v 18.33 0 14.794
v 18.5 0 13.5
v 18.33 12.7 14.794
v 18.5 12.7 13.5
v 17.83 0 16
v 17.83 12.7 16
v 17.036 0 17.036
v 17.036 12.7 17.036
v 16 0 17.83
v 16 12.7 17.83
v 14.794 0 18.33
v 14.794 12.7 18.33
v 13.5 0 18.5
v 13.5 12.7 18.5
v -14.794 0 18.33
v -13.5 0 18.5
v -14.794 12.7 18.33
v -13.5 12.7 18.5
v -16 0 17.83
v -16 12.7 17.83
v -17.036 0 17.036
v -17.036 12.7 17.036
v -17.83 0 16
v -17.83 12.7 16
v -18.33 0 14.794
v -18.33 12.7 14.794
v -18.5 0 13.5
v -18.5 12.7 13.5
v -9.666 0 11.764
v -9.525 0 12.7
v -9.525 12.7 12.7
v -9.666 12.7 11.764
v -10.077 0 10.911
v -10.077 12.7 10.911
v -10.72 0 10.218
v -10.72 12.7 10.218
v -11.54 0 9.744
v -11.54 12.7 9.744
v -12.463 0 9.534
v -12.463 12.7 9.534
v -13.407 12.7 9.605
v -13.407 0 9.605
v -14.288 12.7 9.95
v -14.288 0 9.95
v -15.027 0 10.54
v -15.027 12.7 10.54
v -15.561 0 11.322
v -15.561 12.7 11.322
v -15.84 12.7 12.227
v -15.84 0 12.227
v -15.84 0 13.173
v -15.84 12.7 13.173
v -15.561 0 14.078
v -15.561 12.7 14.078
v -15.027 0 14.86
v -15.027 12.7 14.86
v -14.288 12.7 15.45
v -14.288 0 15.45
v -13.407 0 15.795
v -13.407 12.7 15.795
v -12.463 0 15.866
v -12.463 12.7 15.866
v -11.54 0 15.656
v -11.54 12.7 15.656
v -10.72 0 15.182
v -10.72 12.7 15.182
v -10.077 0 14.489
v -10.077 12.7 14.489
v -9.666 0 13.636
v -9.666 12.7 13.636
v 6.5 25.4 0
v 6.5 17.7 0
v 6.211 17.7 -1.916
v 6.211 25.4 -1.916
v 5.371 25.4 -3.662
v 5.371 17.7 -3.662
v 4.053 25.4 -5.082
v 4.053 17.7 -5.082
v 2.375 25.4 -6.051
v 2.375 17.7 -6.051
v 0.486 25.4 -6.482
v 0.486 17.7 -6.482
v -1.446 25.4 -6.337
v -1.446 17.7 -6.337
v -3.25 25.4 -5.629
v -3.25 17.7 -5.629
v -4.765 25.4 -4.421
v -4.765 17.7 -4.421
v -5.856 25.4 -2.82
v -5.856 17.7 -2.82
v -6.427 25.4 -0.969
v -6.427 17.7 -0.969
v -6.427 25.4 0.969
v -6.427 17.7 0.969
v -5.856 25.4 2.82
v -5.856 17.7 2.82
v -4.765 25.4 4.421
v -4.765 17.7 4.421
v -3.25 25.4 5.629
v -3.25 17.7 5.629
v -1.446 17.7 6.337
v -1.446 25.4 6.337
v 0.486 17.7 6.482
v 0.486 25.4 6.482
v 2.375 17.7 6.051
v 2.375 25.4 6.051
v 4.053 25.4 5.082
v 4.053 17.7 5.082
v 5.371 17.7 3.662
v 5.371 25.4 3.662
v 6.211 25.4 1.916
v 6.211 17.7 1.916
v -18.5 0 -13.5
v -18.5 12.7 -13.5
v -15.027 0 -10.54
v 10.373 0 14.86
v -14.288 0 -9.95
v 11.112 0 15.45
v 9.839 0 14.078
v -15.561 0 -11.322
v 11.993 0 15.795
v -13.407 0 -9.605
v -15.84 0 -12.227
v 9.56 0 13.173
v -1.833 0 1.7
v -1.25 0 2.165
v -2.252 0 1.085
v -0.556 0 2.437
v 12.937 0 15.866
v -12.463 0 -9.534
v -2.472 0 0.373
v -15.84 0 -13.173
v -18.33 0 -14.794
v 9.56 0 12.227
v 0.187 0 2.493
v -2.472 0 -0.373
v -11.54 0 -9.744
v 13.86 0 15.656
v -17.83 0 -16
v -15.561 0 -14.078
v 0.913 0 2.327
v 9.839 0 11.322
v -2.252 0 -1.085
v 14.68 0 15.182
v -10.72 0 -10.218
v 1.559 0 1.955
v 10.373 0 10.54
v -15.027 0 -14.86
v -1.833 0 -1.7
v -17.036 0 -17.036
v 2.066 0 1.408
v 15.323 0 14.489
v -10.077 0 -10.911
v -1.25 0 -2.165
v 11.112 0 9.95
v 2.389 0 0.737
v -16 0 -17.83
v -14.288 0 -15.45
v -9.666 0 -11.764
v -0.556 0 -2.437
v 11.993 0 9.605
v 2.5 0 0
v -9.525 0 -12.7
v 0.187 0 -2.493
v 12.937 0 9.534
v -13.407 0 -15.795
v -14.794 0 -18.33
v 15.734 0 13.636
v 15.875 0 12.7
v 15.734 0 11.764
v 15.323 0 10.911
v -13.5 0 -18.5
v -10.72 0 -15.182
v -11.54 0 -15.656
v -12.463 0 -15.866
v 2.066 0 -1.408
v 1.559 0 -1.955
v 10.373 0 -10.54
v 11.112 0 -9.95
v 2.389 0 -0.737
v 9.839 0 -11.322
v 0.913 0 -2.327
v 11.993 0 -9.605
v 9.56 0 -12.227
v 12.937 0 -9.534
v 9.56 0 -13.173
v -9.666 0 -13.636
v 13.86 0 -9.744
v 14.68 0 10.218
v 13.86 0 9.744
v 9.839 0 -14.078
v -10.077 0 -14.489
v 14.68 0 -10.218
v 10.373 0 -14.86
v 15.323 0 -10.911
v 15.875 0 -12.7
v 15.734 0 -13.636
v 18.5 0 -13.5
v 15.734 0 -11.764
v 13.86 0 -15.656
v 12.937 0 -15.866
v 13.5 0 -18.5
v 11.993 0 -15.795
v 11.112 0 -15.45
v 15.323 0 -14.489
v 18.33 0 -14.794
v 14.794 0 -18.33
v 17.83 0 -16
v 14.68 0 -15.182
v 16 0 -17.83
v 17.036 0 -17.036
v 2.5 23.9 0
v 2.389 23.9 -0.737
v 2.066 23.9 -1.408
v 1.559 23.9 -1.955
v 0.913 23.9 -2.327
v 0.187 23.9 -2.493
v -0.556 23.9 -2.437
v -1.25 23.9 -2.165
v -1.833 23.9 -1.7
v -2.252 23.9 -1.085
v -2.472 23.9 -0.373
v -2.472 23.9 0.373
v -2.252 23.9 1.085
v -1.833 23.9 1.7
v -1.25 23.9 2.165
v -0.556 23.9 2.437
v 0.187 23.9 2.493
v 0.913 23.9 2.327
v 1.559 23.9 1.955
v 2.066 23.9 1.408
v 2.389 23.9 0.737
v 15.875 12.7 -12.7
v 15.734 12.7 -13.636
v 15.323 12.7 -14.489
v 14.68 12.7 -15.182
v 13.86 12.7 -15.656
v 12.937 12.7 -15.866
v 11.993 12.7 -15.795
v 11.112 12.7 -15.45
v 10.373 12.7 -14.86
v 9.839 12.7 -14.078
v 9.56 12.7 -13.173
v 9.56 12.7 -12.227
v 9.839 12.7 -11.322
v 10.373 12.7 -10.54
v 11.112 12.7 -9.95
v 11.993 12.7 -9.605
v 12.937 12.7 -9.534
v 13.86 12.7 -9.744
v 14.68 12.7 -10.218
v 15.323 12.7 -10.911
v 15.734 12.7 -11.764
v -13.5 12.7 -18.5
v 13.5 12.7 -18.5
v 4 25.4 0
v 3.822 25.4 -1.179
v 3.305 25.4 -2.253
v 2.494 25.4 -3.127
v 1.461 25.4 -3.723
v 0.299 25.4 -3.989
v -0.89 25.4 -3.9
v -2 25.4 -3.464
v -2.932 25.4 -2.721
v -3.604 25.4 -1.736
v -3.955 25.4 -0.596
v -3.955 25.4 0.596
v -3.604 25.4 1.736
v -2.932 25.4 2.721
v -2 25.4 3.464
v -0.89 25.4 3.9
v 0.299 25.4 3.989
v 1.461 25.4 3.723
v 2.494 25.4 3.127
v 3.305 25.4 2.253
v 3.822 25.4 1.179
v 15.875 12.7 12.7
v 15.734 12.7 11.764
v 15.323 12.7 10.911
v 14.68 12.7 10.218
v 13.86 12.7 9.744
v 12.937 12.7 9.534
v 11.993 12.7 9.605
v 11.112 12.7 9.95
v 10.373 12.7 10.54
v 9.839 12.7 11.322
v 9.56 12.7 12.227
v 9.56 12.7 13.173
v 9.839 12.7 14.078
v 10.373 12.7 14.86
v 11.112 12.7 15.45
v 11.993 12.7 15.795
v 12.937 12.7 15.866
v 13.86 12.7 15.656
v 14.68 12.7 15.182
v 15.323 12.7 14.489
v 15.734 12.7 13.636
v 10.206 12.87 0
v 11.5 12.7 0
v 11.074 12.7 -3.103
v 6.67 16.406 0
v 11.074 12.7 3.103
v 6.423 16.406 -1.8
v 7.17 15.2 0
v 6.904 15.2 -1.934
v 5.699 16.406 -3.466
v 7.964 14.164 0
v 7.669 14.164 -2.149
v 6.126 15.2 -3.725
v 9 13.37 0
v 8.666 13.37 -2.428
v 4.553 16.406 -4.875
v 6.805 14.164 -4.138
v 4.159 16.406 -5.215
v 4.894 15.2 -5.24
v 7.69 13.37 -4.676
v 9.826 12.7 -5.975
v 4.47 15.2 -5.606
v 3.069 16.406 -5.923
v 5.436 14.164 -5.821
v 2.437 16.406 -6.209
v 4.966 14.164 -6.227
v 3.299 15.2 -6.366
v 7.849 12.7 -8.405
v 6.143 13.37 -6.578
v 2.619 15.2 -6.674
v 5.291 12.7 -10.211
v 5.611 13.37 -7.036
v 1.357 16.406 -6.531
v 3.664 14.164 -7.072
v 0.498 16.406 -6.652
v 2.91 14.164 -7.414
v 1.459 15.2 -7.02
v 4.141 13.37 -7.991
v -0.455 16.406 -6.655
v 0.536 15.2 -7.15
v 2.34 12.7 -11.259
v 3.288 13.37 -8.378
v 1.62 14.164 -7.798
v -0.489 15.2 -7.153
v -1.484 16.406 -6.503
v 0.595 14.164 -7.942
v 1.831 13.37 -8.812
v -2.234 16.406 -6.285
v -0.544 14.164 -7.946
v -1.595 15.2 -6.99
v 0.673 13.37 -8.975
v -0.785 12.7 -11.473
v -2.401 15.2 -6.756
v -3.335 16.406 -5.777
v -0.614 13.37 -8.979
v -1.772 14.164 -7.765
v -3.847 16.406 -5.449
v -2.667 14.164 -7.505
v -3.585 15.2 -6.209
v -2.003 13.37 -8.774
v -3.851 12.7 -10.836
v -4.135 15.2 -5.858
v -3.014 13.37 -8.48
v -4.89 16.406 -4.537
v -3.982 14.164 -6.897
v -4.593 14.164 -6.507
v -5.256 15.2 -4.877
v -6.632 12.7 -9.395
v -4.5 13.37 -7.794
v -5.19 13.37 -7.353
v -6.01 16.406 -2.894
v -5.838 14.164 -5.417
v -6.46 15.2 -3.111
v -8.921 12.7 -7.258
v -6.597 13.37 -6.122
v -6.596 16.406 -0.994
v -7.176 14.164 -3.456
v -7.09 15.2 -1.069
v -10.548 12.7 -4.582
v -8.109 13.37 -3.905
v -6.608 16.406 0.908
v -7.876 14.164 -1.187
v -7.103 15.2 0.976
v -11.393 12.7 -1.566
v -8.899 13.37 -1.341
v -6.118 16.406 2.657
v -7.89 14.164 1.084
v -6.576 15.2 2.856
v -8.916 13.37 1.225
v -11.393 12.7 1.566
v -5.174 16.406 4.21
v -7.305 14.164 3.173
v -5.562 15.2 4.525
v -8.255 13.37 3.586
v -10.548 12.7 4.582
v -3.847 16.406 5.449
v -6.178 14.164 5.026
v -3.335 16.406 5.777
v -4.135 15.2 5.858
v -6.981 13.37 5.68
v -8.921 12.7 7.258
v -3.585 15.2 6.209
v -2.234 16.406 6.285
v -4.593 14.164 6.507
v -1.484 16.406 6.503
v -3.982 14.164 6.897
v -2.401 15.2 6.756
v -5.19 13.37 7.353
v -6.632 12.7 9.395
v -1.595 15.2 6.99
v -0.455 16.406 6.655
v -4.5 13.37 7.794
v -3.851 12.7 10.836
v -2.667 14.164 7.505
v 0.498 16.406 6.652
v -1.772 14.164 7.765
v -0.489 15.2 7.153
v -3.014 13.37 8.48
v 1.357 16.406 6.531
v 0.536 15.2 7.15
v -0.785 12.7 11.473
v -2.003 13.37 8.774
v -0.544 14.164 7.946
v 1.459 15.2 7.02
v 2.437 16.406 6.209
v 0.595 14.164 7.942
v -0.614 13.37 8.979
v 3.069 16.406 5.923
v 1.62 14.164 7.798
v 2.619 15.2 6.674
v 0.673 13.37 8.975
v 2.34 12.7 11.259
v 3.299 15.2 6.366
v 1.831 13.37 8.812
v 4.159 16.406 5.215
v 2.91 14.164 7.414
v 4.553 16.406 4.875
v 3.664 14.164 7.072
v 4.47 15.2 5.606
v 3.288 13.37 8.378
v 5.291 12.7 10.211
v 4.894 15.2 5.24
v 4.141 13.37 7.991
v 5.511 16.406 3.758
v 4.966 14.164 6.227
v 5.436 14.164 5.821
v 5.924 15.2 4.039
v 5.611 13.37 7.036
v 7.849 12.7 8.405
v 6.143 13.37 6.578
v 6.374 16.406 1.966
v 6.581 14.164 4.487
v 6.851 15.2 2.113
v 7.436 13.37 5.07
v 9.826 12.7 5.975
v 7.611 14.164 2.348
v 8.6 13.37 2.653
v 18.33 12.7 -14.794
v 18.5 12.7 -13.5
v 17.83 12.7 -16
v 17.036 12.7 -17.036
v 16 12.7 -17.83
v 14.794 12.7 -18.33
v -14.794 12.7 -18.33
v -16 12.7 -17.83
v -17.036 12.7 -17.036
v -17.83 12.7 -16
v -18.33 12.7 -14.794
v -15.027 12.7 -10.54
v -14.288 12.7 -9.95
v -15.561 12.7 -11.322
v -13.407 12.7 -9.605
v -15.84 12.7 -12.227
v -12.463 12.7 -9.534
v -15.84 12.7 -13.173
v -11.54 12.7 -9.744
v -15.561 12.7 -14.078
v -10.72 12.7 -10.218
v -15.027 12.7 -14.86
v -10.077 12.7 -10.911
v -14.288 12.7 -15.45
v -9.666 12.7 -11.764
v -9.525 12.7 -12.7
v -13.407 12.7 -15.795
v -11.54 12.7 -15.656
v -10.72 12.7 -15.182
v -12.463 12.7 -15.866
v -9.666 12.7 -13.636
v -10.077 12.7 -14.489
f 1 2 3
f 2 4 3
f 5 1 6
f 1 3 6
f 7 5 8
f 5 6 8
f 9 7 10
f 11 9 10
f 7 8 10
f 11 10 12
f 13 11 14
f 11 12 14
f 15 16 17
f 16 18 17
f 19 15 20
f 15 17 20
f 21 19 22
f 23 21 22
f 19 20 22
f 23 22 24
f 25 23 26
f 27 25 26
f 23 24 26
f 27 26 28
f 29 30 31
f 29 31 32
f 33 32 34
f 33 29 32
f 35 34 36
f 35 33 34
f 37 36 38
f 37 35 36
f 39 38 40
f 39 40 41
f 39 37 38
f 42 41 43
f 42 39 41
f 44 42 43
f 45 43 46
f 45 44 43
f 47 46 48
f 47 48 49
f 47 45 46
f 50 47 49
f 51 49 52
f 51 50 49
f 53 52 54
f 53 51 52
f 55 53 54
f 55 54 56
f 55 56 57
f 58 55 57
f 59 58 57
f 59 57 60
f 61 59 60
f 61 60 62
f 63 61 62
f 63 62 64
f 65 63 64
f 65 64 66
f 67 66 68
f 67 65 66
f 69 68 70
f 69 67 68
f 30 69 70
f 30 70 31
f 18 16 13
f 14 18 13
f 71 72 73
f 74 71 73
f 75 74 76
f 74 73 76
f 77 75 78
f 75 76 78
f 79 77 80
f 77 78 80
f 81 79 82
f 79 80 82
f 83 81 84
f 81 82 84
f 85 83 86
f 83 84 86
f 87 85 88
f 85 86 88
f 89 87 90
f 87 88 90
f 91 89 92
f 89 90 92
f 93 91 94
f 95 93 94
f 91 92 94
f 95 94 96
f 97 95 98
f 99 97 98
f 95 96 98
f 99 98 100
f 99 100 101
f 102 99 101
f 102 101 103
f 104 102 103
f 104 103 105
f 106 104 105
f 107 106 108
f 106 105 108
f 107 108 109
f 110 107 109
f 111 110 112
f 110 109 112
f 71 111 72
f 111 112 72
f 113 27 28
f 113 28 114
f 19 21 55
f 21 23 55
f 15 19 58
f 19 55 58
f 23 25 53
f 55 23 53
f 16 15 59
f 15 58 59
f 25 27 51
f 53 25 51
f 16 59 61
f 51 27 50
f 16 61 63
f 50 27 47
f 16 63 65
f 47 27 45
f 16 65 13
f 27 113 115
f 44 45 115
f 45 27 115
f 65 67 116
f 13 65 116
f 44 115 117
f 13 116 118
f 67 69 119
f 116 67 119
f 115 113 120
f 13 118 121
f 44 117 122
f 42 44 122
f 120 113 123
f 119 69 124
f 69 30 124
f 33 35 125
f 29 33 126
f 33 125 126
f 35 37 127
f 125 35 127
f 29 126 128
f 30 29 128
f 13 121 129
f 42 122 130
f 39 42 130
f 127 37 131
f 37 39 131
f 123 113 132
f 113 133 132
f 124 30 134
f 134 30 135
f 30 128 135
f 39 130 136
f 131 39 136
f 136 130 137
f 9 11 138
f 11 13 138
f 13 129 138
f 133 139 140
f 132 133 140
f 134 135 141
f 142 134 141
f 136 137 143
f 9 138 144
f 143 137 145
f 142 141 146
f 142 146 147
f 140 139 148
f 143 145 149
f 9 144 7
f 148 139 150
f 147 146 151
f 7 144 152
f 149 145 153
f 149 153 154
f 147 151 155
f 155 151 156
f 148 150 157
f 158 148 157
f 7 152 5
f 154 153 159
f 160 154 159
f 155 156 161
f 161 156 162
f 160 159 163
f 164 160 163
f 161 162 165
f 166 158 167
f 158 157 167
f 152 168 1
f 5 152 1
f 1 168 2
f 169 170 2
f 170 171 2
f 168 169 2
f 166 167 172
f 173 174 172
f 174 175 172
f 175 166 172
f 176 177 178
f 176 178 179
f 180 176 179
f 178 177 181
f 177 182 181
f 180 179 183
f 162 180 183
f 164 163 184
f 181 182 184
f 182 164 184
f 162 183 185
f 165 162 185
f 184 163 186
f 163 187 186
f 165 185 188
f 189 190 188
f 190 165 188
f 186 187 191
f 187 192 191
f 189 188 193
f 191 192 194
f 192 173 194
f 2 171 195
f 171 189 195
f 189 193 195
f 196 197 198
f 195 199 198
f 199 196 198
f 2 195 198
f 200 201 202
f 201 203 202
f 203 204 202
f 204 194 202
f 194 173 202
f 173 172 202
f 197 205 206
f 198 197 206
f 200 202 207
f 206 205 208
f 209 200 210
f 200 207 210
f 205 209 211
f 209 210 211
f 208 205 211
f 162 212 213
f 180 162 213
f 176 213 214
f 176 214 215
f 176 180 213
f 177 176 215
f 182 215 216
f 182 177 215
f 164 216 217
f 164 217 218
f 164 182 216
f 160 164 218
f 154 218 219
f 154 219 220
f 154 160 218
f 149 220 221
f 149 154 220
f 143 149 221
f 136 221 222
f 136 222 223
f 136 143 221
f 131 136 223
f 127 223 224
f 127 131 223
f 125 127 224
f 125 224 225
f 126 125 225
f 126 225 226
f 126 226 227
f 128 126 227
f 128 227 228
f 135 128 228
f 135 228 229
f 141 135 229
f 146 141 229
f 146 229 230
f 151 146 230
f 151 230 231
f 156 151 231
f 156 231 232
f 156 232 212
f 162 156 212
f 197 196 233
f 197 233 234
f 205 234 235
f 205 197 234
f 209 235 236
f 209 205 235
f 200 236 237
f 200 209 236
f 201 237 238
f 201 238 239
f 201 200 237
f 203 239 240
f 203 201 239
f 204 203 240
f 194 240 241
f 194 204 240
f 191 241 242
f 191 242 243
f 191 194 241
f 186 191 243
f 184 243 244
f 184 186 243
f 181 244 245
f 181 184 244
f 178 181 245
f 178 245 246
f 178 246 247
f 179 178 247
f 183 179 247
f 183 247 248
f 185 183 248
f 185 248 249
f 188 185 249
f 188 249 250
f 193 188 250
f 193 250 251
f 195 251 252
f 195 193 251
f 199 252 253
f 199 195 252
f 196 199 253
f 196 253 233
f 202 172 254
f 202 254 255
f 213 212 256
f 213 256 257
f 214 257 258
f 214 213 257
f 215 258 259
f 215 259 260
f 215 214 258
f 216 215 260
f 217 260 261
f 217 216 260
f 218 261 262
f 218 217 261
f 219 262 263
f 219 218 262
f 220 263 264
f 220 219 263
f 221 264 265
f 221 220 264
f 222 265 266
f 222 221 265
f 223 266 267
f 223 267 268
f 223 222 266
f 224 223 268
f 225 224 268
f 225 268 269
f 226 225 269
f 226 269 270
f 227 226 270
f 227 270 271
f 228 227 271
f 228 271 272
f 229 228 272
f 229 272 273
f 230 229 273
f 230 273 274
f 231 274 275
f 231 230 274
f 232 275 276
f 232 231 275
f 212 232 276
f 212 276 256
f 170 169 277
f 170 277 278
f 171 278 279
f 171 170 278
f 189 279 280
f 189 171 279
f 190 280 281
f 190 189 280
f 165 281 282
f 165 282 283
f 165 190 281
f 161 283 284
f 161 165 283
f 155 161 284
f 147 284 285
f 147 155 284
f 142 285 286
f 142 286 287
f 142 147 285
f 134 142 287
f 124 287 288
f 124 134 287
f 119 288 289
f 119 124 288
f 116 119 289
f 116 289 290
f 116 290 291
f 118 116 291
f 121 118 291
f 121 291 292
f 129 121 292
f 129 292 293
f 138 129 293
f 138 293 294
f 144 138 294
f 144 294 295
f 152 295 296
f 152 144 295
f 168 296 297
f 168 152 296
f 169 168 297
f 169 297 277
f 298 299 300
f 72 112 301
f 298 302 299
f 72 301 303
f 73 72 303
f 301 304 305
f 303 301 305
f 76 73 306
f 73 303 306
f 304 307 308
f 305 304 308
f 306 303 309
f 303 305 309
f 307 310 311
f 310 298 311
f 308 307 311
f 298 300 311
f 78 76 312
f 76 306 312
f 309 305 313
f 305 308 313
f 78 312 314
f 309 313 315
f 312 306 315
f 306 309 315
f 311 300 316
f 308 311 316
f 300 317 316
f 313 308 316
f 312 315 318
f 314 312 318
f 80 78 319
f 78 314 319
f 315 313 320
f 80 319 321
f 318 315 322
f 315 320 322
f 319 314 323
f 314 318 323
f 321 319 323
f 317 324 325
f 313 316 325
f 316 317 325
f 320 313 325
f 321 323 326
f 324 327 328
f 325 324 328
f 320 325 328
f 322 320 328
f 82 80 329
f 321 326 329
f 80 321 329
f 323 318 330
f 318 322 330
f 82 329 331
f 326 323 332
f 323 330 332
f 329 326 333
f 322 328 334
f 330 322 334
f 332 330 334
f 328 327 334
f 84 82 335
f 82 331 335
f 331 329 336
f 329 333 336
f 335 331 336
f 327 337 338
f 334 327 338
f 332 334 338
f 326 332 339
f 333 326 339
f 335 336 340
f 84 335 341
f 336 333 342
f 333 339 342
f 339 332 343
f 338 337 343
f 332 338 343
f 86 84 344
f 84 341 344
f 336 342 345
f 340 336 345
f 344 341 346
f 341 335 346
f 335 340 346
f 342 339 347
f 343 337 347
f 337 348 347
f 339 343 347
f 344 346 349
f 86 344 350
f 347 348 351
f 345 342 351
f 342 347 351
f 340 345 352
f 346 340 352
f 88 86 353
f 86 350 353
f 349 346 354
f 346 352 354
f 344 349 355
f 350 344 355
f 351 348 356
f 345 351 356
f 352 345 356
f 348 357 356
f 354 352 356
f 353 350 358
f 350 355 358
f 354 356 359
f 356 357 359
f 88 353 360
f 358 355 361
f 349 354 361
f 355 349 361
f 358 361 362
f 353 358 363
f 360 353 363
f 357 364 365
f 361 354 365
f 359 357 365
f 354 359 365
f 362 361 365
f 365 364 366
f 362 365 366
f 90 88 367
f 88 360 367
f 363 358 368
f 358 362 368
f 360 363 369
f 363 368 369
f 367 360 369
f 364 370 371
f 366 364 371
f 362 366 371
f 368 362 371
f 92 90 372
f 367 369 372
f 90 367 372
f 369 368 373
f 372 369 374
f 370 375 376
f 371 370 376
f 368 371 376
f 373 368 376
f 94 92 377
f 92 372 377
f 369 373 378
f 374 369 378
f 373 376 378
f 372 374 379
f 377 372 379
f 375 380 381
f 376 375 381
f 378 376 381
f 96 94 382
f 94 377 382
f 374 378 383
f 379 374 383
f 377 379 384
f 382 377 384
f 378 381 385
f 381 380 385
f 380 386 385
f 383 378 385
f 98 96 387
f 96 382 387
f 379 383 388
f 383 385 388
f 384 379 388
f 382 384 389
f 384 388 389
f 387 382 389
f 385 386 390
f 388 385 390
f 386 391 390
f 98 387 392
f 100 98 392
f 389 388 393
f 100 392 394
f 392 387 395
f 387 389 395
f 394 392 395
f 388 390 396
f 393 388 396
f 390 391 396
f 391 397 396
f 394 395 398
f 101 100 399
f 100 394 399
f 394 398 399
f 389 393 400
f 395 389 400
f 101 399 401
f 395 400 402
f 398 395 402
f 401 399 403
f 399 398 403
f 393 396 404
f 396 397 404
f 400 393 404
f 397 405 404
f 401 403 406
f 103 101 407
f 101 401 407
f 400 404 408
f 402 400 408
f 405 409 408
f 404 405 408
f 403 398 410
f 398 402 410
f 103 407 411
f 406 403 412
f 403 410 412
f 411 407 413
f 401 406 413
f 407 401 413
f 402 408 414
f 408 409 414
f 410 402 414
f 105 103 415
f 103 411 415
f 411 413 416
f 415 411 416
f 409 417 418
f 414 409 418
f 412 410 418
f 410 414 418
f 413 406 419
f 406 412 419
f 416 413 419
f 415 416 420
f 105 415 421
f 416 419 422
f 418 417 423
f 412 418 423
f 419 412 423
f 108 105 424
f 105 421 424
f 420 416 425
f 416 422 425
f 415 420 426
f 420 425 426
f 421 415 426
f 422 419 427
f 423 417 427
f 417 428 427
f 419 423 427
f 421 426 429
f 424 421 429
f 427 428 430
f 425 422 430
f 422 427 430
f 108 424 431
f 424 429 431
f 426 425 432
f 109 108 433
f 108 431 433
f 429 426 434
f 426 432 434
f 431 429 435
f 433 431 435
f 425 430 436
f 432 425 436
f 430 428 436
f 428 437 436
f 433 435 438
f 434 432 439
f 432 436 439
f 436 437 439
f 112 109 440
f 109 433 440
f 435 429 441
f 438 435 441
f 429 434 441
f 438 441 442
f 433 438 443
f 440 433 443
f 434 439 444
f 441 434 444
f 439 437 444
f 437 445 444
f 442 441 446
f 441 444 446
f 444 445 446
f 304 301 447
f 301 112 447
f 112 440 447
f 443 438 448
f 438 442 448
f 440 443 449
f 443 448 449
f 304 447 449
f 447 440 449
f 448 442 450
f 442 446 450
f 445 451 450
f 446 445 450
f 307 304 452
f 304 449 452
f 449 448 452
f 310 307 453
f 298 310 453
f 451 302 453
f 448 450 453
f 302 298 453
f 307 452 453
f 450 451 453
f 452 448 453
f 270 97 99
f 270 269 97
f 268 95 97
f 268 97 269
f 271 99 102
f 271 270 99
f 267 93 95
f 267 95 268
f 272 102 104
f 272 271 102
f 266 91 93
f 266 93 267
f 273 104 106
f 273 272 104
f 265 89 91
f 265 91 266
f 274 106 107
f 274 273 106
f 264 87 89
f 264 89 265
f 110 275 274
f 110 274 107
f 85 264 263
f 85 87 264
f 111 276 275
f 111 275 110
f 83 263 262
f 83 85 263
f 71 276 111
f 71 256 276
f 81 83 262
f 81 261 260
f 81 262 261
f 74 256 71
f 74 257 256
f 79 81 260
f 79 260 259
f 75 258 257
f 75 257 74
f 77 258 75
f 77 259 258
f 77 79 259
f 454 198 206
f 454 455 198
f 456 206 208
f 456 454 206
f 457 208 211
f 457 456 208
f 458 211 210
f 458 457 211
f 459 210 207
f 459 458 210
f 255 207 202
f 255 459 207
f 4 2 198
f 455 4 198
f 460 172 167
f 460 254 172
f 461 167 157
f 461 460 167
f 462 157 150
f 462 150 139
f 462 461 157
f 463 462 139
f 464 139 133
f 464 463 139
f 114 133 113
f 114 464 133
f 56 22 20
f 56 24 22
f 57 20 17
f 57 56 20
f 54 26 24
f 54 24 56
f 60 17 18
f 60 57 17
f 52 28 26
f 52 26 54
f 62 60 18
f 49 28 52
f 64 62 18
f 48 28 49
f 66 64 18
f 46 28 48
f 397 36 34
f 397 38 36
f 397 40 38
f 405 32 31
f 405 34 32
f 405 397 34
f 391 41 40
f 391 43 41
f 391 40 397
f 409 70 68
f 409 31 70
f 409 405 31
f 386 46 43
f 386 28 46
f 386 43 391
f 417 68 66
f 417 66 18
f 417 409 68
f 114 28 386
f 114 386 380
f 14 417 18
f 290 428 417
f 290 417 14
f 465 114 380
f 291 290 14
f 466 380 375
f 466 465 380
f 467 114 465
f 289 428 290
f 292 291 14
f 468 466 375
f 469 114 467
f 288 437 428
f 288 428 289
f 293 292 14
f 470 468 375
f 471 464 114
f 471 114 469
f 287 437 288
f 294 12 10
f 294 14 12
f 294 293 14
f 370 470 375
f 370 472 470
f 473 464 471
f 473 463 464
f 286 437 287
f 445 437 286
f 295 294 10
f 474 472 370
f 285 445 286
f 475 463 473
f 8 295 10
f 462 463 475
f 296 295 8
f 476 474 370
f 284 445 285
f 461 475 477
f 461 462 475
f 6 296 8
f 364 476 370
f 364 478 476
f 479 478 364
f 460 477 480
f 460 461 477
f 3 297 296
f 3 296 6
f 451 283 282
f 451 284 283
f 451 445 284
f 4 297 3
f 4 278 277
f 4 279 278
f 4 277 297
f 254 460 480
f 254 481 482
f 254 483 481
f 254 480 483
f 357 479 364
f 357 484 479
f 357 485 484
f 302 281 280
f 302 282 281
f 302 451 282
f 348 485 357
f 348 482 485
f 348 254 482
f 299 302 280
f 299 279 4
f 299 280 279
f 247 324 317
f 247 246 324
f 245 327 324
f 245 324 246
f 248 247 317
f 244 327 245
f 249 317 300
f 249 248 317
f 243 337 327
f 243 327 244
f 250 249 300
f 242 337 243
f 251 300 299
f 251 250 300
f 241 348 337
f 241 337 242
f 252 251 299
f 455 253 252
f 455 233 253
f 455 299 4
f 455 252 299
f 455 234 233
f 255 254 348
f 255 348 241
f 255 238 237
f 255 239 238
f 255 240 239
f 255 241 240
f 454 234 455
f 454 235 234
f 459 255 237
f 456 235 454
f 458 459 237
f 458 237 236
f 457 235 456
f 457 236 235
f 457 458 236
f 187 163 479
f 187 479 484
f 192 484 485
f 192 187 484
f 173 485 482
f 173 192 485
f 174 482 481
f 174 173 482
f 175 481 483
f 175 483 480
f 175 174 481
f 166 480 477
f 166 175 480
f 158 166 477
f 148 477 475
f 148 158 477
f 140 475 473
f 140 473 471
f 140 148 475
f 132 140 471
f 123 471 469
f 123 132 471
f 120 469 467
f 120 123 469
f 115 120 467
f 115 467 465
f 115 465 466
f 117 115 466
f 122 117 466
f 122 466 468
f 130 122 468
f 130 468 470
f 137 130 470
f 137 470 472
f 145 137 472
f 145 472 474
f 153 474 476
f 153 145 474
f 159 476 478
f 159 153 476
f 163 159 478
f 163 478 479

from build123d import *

# Parameters (mm, degrees)
SKETCH1_W           = 37
SKETCH1_H           = 37
SKETCH1_R           = 2.5
SKETCH1_R_2         = 3.175
BOSS_EXTRUDE1_DEPTH = 12.7
SKETCH2_R           = 6.5
SKETCH2_R_2         = 2.5
BOSS_EXTRUDE2_DEPTH = 12.7
FILLET1_R           = 5
CHAMFER1_SIZE       = 1.5


with BuildPart() as part:
    # Sketch1 → Boss-Extrude1 (new body)
    with BuildSketch(Plane(origin=(0, 0, 0), x_dir=(1, 0, 0), z_dir=(0, 1, 0))):
        Rectangle(SKETCH1_W, SKETCH1_H)
        Circle(SKETCH1_R, mode=Mode.SUBTRACT)
        with Locations((-12.7, -12.7)):
            Circle(SKETCH1_R_2, mode=Mode.SUBTRACT)
        with Locations((12.7, -12.7)):
            Circle(SKETCH1_R_2, mode=Mode.SUBTRACT)
        with Locations((12.7, 12.7)):
            Circle(SKETCH1_R_2, mode=Mode.SUBTRACT)
        with Locations((-12.7, 12.7)):
            Circle(SKETCH1_R_2, mode=Mode.SUBTRACT)
    extrude(amount=BOSS_EXTRUDE1_DEPTH)

    # Sketch2 → Boss-Extrude2 (add)
    with BuildSketch(Plane(origin=(0, 12.7, 0), x_dir=(1, 0, 0), z_dir=(0, 1, 0))):
        Circle(SKETCH2_R)
        Circle(SKETCH2_R_2, mode=Mode.SUBTRACT)
    extrude(amount=BOSS_EXTRUDE2_DEPTH)

    # Fillet1
    fillet1_edges = [part.edges().sort_by_distance(p)[0] for p in [
        (-6.5, 12.7, 0),
        (18.5, 6.35, 18.5),
        (-18.5, 6.35, 18.5),
        (-18.5, 6.35, -18.5),
        (18.5, 6.35, -18.5),
    ]]
    fillet(fillet1_edges, radius=FILLET1_R)

    # Chamfer1
    chamfer1_edges = [part.edges().sort_by_distance(p)[0] for p in [
        (-2.5, 25.4, 0),
    ]]
    chamfer(chamfer1_edges, length=CHAMFER1_SIZE)


solid = part.part
